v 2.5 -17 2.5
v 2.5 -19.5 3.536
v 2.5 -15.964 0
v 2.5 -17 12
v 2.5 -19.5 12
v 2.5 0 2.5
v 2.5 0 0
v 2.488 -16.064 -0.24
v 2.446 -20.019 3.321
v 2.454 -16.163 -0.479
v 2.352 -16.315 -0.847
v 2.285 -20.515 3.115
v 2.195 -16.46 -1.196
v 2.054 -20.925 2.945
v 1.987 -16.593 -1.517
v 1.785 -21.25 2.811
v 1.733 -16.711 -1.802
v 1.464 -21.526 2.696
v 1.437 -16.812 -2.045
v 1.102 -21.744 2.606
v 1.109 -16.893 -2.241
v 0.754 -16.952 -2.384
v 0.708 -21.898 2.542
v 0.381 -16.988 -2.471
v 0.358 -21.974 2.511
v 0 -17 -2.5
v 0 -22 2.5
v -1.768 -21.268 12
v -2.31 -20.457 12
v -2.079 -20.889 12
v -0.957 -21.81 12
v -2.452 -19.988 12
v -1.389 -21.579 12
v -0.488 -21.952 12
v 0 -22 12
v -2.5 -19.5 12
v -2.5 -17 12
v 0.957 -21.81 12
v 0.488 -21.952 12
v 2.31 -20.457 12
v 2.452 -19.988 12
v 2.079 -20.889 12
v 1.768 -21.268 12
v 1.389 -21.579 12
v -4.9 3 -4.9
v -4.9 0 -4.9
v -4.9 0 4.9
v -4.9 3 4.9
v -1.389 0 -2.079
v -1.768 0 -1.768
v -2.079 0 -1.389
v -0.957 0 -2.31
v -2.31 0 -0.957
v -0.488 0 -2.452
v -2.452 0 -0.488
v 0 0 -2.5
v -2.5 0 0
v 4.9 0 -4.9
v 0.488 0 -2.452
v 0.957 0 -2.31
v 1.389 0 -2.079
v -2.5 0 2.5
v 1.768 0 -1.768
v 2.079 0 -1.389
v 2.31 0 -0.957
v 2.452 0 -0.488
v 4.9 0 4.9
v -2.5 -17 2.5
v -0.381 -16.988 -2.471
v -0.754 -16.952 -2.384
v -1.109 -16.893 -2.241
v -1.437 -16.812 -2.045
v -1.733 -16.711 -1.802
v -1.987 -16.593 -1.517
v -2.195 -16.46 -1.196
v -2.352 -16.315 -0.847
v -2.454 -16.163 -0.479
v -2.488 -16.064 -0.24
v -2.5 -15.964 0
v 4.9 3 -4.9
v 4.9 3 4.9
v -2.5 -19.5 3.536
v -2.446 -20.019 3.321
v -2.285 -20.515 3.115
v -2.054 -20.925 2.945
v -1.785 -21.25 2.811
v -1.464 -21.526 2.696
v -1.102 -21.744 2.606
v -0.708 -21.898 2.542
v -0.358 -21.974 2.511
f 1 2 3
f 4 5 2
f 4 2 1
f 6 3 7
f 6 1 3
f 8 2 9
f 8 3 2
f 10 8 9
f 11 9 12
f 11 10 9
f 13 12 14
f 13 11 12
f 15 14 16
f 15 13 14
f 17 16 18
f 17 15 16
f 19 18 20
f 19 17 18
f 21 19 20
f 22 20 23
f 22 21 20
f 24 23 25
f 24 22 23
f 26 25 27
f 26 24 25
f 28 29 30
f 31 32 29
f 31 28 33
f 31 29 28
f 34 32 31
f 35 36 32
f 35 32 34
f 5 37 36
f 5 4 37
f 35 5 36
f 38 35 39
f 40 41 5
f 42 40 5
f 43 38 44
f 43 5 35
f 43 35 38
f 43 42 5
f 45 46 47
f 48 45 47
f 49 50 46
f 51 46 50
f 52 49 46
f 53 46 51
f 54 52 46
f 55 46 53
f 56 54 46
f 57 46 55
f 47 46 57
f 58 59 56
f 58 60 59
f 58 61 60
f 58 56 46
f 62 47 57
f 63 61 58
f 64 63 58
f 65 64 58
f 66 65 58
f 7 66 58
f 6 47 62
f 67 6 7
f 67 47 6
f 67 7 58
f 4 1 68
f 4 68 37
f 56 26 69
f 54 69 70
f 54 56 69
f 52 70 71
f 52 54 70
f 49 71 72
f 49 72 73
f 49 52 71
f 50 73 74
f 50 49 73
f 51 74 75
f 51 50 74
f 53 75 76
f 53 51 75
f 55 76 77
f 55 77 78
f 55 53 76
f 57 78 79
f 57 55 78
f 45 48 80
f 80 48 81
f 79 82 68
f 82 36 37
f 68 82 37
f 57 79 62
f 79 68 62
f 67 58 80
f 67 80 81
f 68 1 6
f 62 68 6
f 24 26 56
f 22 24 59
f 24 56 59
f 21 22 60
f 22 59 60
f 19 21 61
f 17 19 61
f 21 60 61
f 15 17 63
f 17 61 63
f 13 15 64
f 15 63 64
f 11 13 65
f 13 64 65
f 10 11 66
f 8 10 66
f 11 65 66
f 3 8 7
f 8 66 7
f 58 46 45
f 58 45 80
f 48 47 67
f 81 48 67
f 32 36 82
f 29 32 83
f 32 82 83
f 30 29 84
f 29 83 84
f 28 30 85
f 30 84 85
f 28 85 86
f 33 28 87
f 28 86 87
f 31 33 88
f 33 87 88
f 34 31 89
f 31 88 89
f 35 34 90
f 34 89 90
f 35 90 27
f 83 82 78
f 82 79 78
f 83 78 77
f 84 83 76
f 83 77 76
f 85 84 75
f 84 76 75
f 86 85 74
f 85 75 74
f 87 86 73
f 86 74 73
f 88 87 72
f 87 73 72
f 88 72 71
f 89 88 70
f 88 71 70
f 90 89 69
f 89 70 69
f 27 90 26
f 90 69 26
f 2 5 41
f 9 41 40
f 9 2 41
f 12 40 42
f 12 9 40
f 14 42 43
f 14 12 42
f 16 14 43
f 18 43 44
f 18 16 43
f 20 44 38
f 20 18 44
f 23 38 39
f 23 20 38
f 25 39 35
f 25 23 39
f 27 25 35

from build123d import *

# Parameters (mm, degrees)
F0_W     = 9.8
F0_H     = 9.8
F2_DEPTH = 3
F1_W     = 17
F1_H     = 5
F3_DEPTH = 2.5
F4_R     = 2.49999


# Not quite as in the source:
# - a fillet or chamfer is up to 0.001 mm smaller than in the source, because OpenCascade refuses the exact size


with BuildPart() as f2:
    # F0 (on Front) → F2 (new body)
    with BuildSketch(Plane.XZ):
        Rectangle(F0_W, F0_H)
    extrude(amount=-F2_DEPTH)

    # F1 (on Right) → F3 (join, symmetric)
    with BuildSketch(Plane.YZ):
        with Locations((-8.5, 0)):
            Rectangle(F1_W, F1_H)
        Polygon((-17, -2.5), (-17, 2.5), (-17, 12), (-22, 12), (-22, 2.5), align=None)
    extrude(amount=F3_DEPTH, both=True)

    # F4 (radius 2.5 in the source; OpenCascade refuses exactly that, so slightly less here)
    f4_edges = [f2.edges().sort_by_distance(p)[0] for p in [
        (-2.5, -8.5, -2.5),
        (-2.5, -19.5, 0),
        (2.5, -8.5, -2.5),
        (2.5, -19.5, 0),
        (2.5, -22, 7.25),
        (-2.5, -22, 7.25),
    ]]
    fillet(f4_edges, radius=F4_R)


solid = f2.part
